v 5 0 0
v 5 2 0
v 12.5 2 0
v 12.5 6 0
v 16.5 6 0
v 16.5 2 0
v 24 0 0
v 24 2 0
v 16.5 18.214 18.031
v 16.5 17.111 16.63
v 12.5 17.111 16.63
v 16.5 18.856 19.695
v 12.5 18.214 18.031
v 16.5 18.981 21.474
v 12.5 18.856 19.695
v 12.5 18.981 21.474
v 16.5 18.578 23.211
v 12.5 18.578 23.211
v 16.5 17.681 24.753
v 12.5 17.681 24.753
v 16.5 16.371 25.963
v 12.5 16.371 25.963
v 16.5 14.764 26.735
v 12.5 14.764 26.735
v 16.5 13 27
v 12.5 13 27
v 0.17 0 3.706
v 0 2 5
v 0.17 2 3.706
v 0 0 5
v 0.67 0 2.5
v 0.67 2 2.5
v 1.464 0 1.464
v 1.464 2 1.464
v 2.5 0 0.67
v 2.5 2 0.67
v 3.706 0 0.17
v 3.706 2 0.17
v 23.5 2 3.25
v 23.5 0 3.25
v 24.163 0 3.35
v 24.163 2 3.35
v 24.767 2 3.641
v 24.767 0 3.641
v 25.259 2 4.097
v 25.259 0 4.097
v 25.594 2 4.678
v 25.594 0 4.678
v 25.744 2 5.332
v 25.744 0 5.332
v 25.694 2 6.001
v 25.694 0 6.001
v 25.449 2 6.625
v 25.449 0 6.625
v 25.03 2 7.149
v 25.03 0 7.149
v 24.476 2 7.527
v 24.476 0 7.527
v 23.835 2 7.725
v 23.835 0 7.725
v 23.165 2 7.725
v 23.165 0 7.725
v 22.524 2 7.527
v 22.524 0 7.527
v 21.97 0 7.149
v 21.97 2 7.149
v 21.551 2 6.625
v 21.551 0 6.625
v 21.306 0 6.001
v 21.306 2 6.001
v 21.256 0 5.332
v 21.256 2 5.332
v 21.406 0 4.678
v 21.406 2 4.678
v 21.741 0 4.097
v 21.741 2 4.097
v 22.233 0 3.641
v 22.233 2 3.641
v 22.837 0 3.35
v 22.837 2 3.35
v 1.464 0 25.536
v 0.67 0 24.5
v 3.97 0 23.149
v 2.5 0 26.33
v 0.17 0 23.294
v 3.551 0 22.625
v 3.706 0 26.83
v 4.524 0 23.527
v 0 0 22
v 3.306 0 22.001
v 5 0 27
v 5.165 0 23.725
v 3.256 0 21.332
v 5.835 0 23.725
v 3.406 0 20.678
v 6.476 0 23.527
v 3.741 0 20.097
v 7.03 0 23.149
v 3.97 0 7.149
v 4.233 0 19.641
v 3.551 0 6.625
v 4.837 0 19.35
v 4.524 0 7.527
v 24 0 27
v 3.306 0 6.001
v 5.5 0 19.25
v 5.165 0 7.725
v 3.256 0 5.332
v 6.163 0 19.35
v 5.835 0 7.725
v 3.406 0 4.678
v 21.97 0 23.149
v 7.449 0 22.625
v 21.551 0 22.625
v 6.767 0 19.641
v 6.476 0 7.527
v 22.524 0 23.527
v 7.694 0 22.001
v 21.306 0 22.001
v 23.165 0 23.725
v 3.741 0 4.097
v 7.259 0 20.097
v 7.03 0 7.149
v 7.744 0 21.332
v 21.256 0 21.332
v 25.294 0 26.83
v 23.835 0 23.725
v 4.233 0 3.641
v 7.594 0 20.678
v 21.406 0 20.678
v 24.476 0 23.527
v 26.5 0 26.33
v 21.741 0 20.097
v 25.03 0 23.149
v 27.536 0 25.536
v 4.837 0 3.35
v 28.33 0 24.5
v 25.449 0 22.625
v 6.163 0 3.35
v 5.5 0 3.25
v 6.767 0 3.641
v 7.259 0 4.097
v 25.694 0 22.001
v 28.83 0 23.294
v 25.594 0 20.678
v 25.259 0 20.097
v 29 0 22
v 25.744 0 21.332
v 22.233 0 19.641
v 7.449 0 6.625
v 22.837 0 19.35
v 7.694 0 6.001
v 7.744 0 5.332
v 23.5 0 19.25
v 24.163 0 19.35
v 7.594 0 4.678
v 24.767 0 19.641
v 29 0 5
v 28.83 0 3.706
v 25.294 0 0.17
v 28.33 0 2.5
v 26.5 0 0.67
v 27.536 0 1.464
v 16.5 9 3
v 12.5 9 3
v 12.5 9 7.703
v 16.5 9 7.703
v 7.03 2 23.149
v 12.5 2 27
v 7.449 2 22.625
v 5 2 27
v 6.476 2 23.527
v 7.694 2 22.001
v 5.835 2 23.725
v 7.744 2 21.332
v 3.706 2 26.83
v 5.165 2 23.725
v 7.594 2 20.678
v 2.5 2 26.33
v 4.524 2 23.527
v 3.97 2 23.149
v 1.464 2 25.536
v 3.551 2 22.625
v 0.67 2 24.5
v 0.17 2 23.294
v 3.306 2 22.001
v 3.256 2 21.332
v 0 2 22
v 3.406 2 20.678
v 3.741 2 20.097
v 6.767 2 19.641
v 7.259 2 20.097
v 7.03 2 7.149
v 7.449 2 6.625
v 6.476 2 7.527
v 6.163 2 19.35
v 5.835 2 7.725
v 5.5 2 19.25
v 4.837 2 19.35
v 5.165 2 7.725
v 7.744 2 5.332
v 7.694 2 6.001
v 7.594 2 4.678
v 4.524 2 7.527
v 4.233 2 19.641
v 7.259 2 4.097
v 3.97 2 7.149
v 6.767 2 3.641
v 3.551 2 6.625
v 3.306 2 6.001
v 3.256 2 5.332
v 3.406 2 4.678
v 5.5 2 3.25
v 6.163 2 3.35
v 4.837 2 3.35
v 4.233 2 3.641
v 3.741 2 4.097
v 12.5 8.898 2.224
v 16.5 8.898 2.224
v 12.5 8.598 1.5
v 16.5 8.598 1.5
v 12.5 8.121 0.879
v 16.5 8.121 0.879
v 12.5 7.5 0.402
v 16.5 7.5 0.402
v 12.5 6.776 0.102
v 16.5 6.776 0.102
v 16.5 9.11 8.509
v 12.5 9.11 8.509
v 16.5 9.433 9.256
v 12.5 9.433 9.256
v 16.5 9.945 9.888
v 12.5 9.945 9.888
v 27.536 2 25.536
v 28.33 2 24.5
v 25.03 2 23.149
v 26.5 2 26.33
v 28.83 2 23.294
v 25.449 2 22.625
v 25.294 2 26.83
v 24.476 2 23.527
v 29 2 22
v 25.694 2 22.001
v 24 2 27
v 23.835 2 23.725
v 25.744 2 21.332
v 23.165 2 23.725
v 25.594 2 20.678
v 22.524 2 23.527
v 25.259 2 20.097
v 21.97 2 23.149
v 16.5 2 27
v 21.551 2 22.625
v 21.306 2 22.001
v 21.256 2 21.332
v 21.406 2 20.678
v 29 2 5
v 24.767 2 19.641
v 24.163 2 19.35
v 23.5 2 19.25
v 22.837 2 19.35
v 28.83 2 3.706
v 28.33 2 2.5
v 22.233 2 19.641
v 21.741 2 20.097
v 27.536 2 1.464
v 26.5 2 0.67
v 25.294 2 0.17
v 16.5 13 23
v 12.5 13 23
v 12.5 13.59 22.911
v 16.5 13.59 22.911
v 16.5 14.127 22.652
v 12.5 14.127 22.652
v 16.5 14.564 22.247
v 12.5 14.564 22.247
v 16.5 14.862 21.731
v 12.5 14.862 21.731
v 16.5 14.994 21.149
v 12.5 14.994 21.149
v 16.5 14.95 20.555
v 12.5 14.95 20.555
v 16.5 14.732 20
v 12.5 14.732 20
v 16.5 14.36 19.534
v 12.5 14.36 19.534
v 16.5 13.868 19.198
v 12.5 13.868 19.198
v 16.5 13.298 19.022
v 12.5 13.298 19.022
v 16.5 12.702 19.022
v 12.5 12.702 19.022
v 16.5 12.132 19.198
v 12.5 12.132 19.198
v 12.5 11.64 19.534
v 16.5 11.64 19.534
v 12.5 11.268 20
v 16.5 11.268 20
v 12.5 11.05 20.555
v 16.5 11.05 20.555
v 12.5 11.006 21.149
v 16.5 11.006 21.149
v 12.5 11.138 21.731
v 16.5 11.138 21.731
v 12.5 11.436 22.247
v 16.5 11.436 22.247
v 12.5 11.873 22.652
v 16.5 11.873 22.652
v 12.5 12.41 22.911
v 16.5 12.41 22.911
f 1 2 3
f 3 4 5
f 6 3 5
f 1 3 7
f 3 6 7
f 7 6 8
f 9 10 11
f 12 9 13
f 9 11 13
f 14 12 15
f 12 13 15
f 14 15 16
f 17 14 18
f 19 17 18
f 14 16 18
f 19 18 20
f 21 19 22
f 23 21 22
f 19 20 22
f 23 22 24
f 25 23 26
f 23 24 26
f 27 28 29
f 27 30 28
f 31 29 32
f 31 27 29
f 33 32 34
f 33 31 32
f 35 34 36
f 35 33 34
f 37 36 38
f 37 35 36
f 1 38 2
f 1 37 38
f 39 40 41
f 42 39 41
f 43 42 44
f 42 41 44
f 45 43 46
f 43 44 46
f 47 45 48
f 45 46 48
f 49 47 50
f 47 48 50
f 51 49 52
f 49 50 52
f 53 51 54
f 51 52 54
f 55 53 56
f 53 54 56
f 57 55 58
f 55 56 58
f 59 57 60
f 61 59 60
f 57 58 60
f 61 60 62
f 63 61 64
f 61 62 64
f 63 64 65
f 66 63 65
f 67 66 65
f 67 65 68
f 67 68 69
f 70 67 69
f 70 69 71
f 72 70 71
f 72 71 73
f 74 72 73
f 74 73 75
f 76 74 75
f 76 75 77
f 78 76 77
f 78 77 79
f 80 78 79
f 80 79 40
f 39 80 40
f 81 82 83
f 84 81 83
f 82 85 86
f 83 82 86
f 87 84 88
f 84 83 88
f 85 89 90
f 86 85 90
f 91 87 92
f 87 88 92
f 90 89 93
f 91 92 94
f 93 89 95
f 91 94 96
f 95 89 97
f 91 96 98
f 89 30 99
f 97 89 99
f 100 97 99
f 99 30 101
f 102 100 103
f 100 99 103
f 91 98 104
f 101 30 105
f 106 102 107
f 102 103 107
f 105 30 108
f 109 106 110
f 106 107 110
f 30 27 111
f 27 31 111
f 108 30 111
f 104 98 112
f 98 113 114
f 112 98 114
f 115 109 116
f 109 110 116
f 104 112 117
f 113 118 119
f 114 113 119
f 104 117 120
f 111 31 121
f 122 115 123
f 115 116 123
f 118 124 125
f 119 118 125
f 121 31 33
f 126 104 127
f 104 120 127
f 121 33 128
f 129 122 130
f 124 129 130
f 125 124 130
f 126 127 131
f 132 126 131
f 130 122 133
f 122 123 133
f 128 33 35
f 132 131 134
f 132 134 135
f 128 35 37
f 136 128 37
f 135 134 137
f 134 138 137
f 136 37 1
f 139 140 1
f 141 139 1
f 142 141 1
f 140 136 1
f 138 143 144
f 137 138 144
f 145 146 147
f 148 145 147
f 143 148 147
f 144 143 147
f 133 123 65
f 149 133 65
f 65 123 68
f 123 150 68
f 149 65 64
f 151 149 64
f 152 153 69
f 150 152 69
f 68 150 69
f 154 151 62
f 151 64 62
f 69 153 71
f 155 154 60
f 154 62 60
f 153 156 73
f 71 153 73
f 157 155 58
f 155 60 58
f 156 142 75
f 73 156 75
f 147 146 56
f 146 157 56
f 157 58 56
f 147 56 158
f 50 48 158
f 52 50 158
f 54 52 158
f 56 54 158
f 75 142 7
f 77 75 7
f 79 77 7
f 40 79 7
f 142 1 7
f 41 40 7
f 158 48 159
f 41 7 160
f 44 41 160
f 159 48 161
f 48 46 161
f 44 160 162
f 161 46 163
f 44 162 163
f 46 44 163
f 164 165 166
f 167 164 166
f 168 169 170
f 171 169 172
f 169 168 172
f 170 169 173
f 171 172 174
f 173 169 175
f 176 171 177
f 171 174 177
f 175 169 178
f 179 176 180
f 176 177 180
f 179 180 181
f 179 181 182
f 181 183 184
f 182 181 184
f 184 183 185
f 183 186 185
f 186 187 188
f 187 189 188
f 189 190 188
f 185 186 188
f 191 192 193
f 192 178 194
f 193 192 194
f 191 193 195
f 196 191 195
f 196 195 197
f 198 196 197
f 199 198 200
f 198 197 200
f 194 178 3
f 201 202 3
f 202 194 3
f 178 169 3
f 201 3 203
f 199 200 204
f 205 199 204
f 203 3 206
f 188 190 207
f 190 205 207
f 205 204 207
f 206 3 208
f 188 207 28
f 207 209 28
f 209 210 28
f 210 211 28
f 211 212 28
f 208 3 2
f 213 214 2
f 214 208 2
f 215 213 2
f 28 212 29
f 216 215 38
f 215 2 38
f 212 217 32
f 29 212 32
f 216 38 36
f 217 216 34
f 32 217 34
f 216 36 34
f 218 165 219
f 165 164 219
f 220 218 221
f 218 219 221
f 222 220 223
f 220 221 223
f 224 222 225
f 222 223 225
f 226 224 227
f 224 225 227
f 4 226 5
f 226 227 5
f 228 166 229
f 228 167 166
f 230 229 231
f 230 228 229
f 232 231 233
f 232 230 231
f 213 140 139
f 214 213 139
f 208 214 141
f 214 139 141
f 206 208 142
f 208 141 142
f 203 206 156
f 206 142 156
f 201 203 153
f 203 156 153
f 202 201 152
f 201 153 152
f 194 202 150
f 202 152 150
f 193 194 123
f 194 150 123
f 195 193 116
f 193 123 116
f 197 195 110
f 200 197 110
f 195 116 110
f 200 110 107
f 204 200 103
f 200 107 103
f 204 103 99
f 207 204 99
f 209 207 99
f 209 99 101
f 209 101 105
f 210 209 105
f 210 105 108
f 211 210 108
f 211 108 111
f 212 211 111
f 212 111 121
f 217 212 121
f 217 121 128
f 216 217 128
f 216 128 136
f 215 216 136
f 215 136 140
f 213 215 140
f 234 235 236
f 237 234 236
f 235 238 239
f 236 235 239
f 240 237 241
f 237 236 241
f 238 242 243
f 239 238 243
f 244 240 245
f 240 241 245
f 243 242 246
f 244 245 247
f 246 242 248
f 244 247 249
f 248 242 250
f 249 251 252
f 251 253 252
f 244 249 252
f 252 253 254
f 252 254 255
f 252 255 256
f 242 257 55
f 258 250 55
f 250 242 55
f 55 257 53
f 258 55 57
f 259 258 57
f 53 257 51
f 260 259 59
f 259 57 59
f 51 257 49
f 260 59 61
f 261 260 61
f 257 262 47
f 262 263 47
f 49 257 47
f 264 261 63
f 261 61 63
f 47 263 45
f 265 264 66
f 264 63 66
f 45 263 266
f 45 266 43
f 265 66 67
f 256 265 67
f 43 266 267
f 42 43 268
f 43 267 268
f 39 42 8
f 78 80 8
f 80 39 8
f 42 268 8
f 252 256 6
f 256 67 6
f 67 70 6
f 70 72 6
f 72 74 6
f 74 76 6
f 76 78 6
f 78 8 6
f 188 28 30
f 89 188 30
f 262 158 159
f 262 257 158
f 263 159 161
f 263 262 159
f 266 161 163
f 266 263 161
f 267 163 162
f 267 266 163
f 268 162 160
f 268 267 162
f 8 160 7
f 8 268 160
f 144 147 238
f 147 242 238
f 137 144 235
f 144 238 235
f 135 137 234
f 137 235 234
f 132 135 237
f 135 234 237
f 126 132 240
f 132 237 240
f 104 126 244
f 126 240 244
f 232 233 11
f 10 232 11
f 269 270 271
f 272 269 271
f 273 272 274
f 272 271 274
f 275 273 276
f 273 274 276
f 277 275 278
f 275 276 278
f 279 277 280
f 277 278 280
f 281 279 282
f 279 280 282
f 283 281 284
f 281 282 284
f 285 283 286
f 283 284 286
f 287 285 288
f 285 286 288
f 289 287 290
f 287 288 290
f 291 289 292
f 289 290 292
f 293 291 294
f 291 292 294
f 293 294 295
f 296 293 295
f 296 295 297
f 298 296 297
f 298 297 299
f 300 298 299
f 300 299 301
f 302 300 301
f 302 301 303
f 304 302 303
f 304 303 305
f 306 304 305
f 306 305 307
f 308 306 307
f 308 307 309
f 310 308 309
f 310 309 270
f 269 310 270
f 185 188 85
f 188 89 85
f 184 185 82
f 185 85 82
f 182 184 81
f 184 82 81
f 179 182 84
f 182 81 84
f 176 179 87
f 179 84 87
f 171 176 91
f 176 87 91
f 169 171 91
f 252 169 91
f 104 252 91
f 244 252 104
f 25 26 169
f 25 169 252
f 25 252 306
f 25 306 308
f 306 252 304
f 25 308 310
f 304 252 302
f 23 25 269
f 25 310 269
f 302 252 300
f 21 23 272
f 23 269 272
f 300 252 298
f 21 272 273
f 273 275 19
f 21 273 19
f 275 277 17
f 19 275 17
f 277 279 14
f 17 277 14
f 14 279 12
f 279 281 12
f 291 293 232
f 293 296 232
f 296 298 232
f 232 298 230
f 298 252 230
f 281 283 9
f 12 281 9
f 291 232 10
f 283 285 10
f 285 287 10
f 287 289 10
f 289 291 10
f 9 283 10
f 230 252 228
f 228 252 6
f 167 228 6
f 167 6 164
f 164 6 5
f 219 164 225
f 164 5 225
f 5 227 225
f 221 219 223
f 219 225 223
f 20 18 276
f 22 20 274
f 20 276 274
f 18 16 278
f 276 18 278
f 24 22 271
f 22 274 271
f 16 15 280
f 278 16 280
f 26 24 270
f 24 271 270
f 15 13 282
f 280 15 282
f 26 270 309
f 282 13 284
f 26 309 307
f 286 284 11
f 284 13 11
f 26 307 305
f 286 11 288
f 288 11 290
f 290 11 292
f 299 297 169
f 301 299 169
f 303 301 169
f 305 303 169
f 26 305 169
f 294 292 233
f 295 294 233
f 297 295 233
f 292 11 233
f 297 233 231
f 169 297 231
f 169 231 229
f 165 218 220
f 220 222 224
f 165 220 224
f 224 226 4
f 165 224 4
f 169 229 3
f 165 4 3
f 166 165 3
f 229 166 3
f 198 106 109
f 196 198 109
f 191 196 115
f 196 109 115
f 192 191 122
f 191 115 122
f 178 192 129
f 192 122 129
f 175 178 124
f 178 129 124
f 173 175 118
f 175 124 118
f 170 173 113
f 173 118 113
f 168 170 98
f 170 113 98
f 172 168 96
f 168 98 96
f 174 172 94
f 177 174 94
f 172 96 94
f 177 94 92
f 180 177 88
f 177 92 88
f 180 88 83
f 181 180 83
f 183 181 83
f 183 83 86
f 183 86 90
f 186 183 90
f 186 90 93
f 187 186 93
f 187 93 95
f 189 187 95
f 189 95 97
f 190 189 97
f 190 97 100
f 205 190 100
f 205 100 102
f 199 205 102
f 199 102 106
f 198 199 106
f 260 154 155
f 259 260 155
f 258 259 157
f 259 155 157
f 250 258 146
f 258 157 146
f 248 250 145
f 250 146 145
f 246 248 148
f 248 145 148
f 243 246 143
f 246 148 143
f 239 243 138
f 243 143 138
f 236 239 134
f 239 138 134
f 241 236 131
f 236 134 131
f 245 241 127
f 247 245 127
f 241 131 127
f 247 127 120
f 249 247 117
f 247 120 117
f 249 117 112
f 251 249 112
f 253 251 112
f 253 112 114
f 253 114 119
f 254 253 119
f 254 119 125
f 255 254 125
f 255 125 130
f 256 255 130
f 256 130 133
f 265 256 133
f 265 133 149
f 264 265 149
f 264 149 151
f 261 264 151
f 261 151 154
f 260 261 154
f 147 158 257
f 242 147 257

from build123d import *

# Parameters (mm, degrees)
BOSS_EXTRU_1_DEPTH      = 27
CONG_1_R                = 5
ESQUISSE2_R             = 2.25
ENL_V_MAT_EXTRU_1_DEPTH = 44.943145085
ENL_V_MAT_EXTRU_2_DEPTH = 27
CONG_2_R                = 3
ESQUISSE4_R             = 2
ENL_V_MAT_EXTRU_3_DEPTH = 37.908671068


with BuildPart() as part:
    # Esquisse1 → Boss.-Extru.1 (new body)
    with BuildSketch(Plane.XY):
        Polygon((0, 0), (29, 0), (29, 2), (16.5, 2), (16.5, 19), (12.5, 19), (12.5, 2), (0, 2), align=None)
    extrude(amount=BOSS_EXTRU_1_DEPTH)

    # Congé1
    cong_1_edges = [part.edges().sort_by_distance(p)[0] for p in [
        (29, 1, 27),
        (0, 1, 0),
        (0, 1, 27),
        (29, 1, 0),
    ]]
    fillet(cong_1_edges, radius=CONG_1_R)

    # Esquisse2 → Enlèv. mat.-Extru.1 (cut, through all)
    with BuildSketch(Plane.XZ):
        with Locations(Location((5.5, 21.5, 0), (0, 0, 270))):
            Circle(ESQUISSE2_R)
        with Locations(Location((5.5, 5.5, 0), (0, 0, 270))):
            Circle(ESQUISSE2_R)
        with Locations(Location((23.5, 5.5, 0), (0, 0, 270))):
            Circle(ESQUISSE2_R)
        with Locations(Location((23.5, 21.5, 0), (0, 0, 270))):
            Circle(ESQUISSE2_R)
    extrude(amount=-ENL_V_MAT_EXTRU_1_DEPTH, mode=Mode.SUBTRACT)

    # Esquisse3 → Enlèv. mat.-Extru.2 (cut)
    with BuildSketch(Plane.ZY.offset(-12.5)):
        with BuildLine():
            Line((0, 9), (9, 9))
            Line((9, 9), (16.629670691, 17.110987927))
            ThreePointArc((16.629670691, 17.110987927), (23.21111105, 18.577722468), (27, 13))
            Line((27, 13), (29.874608193, 13))
            Line((29.874608193, 13), (29.874608193, 22.034695391))
            Line((29.874608193, 22.034695391), (0, 22.034695391))
            Line((0, 22.034695391), (0, 9))
        make_face()
    extrude(amount=-ENL_V_MAT_EXTRU_2_DEPTH, mode=Mode.SUBTRACT)

    # Congé2
    cong_2_edges = [part.edges().sort_by_distance(p)[0] for p in [
        (14.5, 9, 0),
        (14.5, 9, 9),
    ]]
    fillet(cong_2_edges, radius=CONG_2_R)

    # Esquisse4 → Enlèv. mat.-Extru.3 (cut, through all)
    with BuildSketch(Plane.ZY.offset(-12.5)):
        with Locations((21, 13)):
            Circle(ESQUISSE4_R)
    extrude(amount=-ENL_V_MAT_EXTRU_3_DEPTH, mode=Mode.SUBTRACT)


solid = part.part
